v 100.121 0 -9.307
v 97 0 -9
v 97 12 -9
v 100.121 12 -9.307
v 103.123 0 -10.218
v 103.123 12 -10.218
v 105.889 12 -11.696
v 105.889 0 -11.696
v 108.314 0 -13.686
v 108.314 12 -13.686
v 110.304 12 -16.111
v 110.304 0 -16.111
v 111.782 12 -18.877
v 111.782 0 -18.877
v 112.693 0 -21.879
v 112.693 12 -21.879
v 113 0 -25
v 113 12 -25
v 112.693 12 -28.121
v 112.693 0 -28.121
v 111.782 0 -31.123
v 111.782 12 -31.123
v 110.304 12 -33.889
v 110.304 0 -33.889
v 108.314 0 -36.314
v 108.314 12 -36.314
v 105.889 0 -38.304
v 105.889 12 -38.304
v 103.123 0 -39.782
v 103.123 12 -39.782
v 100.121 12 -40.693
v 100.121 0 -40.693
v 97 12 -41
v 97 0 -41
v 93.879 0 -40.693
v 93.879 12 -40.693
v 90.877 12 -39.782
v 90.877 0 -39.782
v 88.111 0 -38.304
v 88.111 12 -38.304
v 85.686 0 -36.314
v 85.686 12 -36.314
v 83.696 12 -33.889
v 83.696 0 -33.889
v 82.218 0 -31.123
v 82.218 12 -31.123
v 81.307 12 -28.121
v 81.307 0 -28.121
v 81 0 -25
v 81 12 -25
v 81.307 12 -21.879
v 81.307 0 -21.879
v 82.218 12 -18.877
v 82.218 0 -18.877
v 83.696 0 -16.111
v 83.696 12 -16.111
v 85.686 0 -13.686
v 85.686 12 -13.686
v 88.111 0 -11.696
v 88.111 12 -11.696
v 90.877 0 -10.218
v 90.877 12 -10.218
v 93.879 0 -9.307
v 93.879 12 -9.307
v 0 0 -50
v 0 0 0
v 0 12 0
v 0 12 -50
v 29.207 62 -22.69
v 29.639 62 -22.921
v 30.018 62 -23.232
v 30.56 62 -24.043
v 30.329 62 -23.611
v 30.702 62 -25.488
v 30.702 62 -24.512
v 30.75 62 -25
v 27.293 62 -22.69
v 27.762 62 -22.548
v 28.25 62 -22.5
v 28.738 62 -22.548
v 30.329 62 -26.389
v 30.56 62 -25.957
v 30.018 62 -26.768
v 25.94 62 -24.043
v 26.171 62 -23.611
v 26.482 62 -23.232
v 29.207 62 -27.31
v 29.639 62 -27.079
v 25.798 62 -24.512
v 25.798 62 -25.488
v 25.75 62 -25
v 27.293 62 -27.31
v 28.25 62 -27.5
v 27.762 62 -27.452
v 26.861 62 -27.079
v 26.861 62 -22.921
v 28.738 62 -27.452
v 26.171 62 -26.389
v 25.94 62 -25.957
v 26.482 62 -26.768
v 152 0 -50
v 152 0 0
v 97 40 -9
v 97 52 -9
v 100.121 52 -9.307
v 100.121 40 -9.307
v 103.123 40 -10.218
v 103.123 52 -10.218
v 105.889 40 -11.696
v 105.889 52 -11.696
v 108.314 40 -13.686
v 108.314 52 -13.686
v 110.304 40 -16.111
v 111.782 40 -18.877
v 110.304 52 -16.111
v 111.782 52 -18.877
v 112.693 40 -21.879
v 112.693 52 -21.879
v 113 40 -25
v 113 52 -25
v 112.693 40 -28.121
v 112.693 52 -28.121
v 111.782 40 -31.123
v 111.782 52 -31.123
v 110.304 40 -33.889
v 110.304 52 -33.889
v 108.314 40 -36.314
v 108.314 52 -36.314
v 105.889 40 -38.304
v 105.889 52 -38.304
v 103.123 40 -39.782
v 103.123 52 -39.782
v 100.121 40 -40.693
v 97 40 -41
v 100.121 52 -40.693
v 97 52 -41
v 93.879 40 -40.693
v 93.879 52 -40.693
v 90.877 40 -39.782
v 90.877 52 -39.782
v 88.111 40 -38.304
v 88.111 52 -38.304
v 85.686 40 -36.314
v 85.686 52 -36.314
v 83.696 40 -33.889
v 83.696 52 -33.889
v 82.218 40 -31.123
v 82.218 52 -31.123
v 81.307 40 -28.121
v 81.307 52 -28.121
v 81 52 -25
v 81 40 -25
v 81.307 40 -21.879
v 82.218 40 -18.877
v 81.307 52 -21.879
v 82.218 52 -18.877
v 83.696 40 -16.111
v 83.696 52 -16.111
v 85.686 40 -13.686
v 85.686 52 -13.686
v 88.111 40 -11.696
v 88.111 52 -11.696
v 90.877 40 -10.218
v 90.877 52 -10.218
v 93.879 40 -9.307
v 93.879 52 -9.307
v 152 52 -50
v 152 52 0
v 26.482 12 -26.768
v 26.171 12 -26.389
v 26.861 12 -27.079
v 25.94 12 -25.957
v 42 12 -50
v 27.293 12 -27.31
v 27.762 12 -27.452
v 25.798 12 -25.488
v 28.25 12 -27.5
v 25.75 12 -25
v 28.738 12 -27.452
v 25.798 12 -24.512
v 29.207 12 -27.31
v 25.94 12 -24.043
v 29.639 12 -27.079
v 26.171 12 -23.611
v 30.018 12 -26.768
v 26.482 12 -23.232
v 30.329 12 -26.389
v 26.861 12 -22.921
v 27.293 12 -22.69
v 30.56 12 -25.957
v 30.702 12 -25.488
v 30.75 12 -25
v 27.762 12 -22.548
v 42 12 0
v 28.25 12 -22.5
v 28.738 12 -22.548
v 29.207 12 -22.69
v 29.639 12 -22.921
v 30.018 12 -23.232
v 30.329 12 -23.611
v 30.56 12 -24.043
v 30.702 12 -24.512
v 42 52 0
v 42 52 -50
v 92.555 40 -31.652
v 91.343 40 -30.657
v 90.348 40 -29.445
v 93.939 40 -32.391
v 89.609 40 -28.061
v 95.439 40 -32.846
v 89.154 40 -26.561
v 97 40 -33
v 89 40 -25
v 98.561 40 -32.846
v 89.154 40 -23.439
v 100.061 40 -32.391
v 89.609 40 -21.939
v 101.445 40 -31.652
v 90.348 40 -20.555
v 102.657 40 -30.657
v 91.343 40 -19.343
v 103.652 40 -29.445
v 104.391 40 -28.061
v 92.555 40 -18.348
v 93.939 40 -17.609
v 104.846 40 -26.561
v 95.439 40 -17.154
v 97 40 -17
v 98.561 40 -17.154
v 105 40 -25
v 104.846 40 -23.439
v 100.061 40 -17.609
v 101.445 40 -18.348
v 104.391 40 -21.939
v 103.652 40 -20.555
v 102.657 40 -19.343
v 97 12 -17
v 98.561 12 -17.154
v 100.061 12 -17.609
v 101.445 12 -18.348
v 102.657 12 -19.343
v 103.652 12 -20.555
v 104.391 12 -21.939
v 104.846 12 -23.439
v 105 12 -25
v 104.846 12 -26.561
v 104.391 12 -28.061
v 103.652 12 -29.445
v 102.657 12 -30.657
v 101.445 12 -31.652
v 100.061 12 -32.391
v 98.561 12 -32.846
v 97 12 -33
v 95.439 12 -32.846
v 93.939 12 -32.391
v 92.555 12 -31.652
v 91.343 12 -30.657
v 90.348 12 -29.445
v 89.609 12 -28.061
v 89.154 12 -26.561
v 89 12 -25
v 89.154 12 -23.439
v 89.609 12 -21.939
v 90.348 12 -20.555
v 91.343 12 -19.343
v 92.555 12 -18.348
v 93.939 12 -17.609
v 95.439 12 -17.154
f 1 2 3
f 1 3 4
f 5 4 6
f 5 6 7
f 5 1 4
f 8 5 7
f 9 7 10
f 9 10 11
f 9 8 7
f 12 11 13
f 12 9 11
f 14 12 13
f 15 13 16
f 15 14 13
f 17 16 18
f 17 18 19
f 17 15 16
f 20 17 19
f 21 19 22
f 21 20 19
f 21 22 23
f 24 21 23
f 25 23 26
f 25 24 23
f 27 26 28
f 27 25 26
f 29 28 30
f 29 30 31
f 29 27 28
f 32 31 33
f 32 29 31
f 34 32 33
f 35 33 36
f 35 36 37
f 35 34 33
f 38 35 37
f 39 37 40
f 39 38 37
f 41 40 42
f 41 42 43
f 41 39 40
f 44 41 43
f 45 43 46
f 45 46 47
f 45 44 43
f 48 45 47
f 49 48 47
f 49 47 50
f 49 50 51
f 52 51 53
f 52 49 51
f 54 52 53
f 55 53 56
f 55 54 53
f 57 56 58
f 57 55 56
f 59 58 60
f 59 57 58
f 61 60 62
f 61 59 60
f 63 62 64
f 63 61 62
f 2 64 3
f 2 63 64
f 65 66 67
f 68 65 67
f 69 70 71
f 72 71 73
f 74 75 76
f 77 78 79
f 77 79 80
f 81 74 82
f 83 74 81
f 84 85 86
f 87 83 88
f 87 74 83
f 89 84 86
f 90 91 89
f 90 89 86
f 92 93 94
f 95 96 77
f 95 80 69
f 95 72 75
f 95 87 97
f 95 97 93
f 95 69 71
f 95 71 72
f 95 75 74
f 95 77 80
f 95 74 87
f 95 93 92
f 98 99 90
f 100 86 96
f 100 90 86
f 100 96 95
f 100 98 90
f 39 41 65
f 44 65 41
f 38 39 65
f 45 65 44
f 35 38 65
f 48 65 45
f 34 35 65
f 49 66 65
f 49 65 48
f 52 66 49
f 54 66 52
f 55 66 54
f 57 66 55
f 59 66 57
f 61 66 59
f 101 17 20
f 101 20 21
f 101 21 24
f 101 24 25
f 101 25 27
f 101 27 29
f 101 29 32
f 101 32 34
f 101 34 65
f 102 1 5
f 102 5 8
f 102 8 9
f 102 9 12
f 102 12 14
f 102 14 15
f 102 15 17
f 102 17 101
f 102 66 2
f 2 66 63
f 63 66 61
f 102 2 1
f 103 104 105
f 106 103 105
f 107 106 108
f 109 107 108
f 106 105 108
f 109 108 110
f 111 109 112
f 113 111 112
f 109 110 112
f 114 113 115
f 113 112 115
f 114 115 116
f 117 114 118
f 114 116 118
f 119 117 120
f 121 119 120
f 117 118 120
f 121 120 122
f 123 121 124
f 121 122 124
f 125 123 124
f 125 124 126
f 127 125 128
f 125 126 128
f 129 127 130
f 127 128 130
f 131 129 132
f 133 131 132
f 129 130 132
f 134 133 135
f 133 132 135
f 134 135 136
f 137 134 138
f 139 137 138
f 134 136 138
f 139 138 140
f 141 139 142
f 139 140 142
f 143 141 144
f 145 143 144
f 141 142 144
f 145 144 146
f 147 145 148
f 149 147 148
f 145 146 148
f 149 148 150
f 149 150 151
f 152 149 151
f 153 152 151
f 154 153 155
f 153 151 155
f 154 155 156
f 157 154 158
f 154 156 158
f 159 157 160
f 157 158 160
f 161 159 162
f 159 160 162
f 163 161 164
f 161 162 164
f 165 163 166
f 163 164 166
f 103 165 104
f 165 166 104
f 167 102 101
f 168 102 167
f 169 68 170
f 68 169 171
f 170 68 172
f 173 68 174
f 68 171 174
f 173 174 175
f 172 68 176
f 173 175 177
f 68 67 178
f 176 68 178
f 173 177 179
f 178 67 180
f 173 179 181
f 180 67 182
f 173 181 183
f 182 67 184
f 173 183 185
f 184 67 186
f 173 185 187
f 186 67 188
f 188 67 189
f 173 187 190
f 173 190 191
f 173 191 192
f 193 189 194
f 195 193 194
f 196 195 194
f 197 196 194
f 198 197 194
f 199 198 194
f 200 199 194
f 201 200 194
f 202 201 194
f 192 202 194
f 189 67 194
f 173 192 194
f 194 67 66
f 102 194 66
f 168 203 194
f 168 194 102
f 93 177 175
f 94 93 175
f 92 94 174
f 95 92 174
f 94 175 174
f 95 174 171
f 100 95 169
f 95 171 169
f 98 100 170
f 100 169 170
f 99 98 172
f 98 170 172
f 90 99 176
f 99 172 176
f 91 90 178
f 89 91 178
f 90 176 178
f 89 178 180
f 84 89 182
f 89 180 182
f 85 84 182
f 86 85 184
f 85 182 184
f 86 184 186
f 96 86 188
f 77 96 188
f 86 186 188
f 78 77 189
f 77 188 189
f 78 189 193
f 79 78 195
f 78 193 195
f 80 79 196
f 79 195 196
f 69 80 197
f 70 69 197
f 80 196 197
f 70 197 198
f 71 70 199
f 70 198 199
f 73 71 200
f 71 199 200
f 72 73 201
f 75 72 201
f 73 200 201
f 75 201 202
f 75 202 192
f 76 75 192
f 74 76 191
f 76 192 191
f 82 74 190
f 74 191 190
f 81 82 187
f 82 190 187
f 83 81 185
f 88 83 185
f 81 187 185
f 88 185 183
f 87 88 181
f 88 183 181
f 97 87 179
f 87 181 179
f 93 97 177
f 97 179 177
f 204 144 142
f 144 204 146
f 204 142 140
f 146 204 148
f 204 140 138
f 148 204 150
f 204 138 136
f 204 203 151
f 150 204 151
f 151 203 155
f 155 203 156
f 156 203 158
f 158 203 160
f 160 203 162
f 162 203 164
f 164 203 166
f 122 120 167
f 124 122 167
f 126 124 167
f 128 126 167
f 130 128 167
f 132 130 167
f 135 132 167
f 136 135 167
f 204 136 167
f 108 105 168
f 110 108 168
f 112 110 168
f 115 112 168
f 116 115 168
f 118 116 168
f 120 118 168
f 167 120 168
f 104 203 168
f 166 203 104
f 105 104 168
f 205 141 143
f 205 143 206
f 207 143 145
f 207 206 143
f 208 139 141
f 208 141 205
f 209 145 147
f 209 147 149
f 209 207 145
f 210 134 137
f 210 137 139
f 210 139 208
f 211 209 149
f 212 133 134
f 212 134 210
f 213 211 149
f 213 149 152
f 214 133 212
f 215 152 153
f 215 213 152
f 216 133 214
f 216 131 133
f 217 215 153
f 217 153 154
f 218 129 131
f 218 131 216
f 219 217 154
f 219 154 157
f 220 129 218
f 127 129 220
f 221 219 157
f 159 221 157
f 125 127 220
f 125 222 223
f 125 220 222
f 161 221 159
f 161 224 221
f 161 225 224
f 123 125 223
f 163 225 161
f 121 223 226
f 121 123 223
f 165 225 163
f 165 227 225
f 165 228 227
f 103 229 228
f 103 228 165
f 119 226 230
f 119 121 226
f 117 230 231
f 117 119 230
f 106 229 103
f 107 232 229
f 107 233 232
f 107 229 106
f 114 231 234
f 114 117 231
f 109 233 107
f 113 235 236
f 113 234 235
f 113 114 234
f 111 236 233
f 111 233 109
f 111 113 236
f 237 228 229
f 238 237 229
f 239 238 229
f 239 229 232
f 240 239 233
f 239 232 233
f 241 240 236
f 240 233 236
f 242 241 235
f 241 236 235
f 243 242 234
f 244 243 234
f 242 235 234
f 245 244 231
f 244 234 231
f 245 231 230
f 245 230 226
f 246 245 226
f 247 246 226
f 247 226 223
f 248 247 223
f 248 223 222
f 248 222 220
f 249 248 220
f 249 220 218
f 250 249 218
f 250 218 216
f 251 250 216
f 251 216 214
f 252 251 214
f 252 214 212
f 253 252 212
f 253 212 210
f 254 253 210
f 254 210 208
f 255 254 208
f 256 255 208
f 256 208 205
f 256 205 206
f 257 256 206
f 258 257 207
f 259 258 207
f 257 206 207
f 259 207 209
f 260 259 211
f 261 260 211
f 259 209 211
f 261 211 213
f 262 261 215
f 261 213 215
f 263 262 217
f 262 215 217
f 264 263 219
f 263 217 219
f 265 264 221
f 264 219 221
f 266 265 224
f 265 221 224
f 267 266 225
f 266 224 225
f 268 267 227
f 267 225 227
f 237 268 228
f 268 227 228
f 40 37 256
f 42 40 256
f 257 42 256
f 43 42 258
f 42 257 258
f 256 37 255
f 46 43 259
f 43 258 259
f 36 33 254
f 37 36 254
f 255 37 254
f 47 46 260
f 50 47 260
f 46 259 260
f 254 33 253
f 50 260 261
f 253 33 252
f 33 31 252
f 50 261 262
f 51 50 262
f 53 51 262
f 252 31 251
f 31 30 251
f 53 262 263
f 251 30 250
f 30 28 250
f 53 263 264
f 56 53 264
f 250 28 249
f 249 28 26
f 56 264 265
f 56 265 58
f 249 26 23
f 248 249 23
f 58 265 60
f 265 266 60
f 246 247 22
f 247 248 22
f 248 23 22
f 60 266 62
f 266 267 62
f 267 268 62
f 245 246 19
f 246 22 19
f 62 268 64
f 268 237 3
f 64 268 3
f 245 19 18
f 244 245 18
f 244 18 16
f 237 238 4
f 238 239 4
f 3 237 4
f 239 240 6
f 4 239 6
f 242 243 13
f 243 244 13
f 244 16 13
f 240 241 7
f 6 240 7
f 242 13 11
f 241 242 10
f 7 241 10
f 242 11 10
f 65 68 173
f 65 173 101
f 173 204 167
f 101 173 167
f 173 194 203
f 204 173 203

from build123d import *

# Parameters (mm, degrees)
SKETCH1_W                = 152
SKETCH1_H                = 52
BOSS_EXTRUDE1_DEPTH      = 50
SKETCH2_W                = 42
SKETCH2_H                = 40
CUT_EXTRUDE1_DEPTH       = 169.249814264
SKETCH3_R                = 16
CUT_EXTRUDE2_DEPTH       = 12
SKETCH4_R                = 8
CUT_EXTRUDE3_DEPTH       = 165.93635136
BOSS_EXTRUDE2_DEPTH      = 10
BOSS_EXTRUDE2_DEPTH_BACK = 40
SKETCH6_R                = 2.5


with BuildPart() as part:
    # Sketch1 → Boss-Extrude1 (new body)
    with BuildSketch(Plane.XY):
        with Locations((76, 26)):
            Rectangle(SKETCH1_W, SKETCH1_H)
    extrude(amount=-BOSS_EXTRUDE1_DEPTH)

    # Sketch2 → Cut-Extrude1 (cut, through all)
    with BuildSketch(Plane.XY):
        with Locations((21, 32)):
            Rectangle(SKETCH2_W, SKETCH2_H)
    extrude(amount=-CUT_EXTRUDE1_DEPTH, mode=Mode.SUBTRACT)

    # Sketch3 → Cut-Extrude2 (cut)
    with BuildSketch(Plane(origin=(0, 52, 0), x_dir=(1, 0, 0), z_dir=(0, 1, 0))):
        with Locations(Location((97, 25, 0), (0, 0, 270))):
            Circle(SKETCH3_R)
    cut_extrude2 = extrude(amount=-CUT_EXTRUDE2_DEPTH, mode=Mode.SUBTRACT)

    # Mirror1: Cut-Extrude2 across plane
    add(cut_extrude2.mirror(Plane.ZX.offset(26)), mode=Mode.SUBTRACT)

    # Sketch4 → Cut-Extrude3 (cut, through all)
    with BuildSketch(Plane(origin=(0, 40, 0), x_dir=(1, 0, 0), z_dir=(0, 1, 0))):
        with Locations(Location((97, 25, 0), (0, 0, 270))):
            Circle(SKETCH4_R)
    extrude(amount=-CUT_EXTRUDE3_DEPTH, mode=Mode.SUBTRACT)

    # Sketch6 → Boss-Extrude2 (add, two sides: drawn at the far end of the back side and taken through both)
    with BuildSketch(Plane(origin=(0, 52, 0), x_dir=(1, 0, 0), z_dir=(0, 1, 0)).offset(-BOSS_EXTRUDE2_DEPTH_BACK)):
        with Locations(Location((28.25, 25, 0), (0, 0, 90))):
            Circle(SKETCH6_R)
    extrude(amount=BOSS_EXTRUDE2_DEPTH + BOSS_EXTRUDE2_DEPTH_BACK)


solid = part.part
